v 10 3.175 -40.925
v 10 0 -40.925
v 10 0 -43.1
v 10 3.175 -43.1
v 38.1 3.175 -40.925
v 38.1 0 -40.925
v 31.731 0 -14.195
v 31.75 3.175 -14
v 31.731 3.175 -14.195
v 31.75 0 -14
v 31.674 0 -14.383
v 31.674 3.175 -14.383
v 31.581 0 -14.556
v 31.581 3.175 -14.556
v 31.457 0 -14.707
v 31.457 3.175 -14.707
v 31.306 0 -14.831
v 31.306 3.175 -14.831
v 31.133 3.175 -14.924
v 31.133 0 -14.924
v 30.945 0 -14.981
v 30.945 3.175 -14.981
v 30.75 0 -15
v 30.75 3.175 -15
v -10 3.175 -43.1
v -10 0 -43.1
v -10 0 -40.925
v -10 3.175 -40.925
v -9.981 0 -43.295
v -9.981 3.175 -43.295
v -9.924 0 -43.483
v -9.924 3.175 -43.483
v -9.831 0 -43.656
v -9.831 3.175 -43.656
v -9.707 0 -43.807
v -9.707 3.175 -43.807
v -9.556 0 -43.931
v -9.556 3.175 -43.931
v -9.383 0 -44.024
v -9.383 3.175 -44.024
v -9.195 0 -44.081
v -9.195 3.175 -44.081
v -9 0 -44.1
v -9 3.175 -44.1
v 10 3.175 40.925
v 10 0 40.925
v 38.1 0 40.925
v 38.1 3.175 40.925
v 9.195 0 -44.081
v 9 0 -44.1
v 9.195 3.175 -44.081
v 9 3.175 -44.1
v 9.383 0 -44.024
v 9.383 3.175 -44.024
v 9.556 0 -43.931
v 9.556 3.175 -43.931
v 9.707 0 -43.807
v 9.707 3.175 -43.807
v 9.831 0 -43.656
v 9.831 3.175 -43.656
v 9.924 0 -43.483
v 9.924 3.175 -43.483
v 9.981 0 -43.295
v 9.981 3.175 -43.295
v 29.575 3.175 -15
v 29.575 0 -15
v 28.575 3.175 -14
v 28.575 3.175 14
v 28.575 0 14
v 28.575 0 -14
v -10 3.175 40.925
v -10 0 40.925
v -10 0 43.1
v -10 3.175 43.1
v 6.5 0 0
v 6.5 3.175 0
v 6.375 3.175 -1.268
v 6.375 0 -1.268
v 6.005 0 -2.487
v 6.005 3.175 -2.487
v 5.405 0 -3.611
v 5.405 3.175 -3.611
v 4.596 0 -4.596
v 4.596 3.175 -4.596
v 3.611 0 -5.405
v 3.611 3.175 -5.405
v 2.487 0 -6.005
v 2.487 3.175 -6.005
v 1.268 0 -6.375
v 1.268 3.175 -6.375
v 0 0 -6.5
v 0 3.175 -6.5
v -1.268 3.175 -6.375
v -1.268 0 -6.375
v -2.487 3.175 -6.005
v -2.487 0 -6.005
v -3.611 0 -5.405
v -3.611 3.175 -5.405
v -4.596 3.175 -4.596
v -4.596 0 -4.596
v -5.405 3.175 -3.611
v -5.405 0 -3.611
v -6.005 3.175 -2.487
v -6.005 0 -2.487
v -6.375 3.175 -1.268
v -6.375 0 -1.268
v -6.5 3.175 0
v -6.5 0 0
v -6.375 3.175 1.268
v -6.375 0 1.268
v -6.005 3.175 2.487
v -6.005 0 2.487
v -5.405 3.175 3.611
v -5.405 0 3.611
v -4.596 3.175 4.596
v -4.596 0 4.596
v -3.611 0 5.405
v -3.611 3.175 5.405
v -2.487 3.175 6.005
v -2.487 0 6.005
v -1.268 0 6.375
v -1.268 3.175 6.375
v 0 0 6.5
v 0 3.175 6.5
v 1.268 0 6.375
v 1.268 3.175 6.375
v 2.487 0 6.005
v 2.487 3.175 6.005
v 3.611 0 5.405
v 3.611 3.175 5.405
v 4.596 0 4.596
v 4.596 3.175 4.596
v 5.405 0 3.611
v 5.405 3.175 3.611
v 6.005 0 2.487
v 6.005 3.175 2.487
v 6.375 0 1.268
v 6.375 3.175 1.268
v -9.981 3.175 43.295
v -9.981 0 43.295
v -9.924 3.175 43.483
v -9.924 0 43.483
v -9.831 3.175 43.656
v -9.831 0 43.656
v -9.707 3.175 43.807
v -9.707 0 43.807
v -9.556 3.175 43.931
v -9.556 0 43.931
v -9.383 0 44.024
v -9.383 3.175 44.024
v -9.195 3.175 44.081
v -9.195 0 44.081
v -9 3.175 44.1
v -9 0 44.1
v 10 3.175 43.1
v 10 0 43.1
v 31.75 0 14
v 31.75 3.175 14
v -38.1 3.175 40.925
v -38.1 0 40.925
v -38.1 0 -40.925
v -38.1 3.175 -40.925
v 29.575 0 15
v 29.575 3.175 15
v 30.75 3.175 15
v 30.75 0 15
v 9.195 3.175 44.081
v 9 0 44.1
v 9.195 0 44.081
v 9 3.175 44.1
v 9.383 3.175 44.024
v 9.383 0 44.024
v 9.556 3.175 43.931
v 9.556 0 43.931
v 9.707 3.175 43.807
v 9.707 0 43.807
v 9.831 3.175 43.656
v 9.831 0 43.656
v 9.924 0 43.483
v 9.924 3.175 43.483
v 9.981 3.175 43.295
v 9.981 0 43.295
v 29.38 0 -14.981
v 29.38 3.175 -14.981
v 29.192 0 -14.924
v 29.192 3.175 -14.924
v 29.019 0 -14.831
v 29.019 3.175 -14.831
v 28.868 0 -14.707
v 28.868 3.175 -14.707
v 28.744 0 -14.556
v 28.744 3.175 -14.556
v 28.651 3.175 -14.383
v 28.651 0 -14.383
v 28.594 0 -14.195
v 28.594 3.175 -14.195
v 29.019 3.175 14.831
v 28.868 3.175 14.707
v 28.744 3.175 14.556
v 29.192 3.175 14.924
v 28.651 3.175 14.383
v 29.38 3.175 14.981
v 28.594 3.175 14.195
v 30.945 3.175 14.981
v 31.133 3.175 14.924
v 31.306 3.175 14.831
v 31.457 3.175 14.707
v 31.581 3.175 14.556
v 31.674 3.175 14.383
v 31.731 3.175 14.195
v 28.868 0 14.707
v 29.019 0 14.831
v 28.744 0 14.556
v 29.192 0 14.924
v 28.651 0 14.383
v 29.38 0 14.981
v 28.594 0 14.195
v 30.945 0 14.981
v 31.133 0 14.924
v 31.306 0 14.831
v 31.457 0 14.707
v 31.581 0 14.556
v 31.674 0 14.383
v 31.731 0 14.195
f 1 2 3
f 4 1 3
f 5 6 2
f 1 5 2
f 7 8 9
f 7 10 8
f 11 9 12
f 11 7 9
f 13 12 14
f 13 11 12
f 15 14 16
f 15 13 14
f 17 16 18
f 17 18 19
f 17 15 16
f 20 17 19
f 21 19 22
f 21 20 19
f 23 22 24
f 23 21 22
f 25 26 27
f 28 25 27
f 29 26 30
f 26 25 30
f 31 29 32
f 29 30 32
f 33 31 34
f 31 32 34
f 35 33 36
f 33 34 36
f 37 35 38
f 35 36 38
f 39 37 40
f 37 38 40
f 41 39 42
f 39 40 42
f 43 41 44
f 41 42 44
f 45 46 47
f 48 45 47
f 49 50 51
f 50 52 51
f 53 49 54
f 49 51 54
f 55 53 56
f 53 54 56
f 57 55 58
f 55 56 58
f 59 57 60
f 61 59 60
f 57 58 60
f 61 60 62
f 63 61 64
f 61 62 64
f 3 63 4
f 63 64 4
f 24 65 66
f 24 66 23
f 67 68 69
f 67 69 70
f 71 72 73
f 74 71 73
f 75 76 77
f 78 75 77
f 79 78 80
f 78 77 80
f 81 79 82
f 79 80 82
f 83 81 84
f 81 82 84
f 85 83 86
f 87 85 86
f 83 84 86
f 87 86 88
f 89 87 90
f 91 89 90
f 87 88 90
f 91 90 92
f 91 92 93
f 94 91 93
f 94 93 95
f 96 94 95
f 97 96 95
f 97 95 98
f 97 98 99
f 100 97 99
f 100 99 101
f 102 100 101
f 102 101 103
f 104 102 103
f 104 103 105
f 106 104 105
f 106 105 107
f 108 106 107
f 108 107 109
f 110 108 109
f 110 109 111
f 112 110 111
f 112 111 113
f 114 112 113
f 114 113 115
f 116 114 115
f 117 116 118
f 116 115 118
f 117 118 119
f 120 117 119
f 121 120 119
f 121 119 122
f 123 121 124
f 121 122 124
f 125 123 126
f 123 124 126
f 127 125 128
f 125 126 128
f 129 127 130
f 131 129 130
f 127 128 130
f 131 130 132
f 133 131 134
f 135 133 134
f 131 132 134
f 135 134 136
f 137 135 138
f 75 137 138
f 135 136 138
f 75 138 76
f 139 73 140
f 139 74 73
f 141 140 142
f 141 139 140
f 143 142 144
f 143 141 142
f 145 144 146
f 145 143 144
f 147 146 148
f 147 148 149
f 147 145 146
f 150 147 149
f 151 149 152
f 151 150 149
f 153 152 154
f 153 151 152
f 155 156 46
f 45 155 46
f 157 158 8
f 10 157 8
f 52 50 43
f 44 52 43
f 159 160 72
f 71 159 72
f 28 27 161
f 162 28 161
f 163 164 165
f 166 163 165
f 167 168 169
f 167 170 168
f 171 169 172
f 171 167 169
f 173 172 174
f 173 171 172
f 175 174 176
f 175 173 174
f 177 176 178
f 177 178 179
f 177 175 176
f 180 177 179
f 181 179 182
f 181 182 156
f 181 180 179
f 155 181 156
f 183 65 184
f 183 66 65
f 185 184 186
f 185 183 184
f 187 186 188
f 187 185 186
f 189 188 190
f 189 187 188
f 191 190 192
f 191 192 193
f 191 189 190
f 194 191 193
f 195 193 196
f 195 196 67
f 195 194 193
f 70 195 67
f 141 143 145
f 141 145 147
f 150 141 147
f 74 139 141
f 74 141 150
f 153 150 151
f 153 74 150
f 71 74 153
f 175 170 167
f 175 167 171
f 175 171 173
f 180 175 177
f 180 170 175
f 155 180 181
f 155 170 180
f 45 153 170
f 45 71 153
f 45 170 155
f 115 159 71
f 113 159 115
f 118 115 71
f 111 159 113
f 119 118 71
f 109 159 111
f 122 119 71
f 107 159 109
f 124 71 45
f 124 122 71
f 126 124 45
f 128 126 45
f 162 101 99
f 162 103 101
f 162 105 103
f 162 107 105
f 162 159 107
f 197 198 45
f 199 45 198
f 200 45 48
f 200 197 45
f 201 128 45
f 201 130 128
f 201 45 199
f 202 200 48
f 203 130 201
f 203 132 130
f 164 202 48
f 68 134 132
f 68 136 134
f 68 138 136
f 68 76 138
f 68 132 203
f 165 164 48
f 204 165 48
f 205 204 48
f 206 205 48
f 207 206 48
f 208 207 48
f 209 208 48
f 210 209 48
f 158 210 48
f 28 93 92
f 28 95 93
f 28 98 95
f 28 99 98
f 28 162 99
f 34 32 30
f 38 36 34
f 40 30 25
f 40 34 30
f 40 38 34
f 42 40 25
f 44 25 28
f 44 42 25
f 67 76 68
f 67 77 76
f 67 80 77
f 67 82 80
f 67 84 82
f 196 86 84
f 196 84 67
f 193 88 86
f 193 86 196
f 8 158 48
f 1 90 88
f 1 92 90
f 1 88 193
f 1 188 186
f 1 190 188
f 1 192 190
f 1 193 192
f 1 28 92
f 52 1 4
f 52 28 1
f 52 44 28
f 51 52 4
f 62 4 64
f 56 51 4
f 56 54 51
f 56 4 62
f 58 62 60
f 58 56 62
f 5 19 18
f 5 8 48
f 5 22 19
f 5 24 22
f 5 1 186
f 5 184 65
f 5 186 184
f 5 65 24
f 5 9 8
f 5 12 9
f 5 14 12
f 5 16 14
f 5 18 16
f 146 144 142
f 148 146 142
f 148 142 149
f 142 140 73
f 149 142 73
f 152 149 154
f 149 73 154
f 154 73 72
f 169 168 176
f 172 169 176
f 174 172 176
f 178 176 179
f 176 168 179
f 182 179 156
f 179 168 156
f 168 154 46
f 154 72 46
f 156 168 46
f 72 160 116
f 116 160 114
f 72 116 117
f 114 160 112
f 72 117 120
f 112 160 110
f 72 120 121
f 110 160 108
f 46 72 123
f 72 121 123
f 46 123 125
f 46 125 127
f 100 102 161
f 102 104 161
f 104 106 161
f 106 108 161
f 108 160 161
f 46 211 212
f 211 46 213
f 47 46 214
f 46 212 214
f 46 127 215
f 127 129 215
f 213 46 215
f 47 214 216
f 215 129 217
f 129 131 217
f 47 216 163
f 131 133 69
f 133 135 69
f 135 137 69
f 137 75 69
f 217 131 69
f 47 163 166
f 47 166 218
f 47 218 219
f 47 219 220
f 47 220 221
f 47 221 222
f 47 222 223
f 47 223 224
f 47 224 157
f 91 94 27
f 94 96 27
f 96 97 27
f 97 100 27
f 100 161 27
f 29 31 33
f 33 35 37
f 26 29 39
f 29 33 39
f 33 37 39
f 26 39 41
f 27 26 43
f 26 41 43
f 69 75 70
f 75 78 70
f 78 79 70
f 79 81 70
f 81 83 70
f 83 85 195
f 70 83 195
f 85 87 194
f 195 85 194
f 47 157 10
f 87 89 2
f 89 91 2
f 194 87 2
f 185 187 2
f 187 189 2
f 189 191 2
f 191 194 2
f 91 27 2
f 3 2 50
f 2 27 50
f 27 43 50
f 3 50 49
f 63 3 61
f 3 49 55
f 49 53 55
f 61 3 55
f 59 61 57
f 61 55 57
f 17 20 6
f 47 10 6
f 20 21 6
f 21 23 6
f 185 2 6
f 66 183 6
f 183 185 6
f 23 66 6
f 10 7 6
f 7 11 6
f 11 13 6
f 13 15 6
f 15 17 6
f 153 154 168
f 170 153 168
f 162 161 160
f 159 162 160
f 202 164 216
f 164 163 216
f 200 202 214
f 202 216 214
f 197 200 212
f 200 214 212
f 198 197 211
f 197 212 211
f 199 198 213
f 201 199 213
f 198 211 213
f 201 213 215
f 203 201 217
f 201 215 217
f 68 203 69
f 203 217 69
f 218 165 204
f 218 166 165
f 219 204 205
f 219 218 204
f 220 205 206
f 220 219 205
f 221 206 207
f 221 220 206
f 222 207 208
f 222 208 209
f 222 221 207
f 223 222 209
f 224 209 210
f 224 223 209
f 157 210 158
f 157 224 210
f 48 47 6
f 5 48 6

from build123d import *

# Parameters (mm, degrees)
BOSS_EXTRUDE1_DEPTH = 3.175
SKETCH2_R           = 6.5
SKETCH2_W           = 3.175
SKETCH2_H           = 30
CUT_EXTRUDE1_DEPTH  = 4.175
FILLET1_R           = 1


with BuildPart() as part:
    # Sketch1 → Boss-Extrude1 (new body)
    with BuildSketch(Plane(origin=(0, 0, 0), x_dir=(1, 0, 0), z_dir=(0, 1, 0))):
        Polygon((-38.1, -40.925), (-10, -40.925), (-10, -44.1), (10, -44.1), (10, -40.925), (38.1, -40.925), (38.1, 40.925), (10, 40.925), (10, 44.1), (-10, 44.1), (-10, 40.925), (-38.1, 40.925), align=None)
    extrude(amount=BOSS_EXTRUDE1_DEPTH)

    # Sketch2 → Cut-Extrude1 (cut, through all)
    with BuildSketch(Plane(origin=(0, 3.175, 0), x_dir=(1, 0, 0), z_dir=(0, 1, 0))):
        Circle(SKETCH2_R)
        with Locations((30.1625, 0)):
            Rectangle(SKETCH2_W, SKETCH2_H)
    extrude(amount=-CUT_EXTRUDE1_DEPTH, mode=Mode.SUBTRACT)

    # Fillet1
    fillet1_edges = [part.edges().sort_by_distance(p)[0] for p in [
        (10, 1.5875, 44.1),
        (-10, 1.5875, 44.1),
        (-10, 1.5875, -44.1),
        (10, 1.5875, -44.1),
        (28.575, 1.5875, 15),
        (28.575, 1.5875, -15),
        (31.75, 1.5875, -15),
        (31.75, 1.5875, 15),
    ]]
    fillet(fillet1_edges, radius=FILLET1_R)


solid = part.part
